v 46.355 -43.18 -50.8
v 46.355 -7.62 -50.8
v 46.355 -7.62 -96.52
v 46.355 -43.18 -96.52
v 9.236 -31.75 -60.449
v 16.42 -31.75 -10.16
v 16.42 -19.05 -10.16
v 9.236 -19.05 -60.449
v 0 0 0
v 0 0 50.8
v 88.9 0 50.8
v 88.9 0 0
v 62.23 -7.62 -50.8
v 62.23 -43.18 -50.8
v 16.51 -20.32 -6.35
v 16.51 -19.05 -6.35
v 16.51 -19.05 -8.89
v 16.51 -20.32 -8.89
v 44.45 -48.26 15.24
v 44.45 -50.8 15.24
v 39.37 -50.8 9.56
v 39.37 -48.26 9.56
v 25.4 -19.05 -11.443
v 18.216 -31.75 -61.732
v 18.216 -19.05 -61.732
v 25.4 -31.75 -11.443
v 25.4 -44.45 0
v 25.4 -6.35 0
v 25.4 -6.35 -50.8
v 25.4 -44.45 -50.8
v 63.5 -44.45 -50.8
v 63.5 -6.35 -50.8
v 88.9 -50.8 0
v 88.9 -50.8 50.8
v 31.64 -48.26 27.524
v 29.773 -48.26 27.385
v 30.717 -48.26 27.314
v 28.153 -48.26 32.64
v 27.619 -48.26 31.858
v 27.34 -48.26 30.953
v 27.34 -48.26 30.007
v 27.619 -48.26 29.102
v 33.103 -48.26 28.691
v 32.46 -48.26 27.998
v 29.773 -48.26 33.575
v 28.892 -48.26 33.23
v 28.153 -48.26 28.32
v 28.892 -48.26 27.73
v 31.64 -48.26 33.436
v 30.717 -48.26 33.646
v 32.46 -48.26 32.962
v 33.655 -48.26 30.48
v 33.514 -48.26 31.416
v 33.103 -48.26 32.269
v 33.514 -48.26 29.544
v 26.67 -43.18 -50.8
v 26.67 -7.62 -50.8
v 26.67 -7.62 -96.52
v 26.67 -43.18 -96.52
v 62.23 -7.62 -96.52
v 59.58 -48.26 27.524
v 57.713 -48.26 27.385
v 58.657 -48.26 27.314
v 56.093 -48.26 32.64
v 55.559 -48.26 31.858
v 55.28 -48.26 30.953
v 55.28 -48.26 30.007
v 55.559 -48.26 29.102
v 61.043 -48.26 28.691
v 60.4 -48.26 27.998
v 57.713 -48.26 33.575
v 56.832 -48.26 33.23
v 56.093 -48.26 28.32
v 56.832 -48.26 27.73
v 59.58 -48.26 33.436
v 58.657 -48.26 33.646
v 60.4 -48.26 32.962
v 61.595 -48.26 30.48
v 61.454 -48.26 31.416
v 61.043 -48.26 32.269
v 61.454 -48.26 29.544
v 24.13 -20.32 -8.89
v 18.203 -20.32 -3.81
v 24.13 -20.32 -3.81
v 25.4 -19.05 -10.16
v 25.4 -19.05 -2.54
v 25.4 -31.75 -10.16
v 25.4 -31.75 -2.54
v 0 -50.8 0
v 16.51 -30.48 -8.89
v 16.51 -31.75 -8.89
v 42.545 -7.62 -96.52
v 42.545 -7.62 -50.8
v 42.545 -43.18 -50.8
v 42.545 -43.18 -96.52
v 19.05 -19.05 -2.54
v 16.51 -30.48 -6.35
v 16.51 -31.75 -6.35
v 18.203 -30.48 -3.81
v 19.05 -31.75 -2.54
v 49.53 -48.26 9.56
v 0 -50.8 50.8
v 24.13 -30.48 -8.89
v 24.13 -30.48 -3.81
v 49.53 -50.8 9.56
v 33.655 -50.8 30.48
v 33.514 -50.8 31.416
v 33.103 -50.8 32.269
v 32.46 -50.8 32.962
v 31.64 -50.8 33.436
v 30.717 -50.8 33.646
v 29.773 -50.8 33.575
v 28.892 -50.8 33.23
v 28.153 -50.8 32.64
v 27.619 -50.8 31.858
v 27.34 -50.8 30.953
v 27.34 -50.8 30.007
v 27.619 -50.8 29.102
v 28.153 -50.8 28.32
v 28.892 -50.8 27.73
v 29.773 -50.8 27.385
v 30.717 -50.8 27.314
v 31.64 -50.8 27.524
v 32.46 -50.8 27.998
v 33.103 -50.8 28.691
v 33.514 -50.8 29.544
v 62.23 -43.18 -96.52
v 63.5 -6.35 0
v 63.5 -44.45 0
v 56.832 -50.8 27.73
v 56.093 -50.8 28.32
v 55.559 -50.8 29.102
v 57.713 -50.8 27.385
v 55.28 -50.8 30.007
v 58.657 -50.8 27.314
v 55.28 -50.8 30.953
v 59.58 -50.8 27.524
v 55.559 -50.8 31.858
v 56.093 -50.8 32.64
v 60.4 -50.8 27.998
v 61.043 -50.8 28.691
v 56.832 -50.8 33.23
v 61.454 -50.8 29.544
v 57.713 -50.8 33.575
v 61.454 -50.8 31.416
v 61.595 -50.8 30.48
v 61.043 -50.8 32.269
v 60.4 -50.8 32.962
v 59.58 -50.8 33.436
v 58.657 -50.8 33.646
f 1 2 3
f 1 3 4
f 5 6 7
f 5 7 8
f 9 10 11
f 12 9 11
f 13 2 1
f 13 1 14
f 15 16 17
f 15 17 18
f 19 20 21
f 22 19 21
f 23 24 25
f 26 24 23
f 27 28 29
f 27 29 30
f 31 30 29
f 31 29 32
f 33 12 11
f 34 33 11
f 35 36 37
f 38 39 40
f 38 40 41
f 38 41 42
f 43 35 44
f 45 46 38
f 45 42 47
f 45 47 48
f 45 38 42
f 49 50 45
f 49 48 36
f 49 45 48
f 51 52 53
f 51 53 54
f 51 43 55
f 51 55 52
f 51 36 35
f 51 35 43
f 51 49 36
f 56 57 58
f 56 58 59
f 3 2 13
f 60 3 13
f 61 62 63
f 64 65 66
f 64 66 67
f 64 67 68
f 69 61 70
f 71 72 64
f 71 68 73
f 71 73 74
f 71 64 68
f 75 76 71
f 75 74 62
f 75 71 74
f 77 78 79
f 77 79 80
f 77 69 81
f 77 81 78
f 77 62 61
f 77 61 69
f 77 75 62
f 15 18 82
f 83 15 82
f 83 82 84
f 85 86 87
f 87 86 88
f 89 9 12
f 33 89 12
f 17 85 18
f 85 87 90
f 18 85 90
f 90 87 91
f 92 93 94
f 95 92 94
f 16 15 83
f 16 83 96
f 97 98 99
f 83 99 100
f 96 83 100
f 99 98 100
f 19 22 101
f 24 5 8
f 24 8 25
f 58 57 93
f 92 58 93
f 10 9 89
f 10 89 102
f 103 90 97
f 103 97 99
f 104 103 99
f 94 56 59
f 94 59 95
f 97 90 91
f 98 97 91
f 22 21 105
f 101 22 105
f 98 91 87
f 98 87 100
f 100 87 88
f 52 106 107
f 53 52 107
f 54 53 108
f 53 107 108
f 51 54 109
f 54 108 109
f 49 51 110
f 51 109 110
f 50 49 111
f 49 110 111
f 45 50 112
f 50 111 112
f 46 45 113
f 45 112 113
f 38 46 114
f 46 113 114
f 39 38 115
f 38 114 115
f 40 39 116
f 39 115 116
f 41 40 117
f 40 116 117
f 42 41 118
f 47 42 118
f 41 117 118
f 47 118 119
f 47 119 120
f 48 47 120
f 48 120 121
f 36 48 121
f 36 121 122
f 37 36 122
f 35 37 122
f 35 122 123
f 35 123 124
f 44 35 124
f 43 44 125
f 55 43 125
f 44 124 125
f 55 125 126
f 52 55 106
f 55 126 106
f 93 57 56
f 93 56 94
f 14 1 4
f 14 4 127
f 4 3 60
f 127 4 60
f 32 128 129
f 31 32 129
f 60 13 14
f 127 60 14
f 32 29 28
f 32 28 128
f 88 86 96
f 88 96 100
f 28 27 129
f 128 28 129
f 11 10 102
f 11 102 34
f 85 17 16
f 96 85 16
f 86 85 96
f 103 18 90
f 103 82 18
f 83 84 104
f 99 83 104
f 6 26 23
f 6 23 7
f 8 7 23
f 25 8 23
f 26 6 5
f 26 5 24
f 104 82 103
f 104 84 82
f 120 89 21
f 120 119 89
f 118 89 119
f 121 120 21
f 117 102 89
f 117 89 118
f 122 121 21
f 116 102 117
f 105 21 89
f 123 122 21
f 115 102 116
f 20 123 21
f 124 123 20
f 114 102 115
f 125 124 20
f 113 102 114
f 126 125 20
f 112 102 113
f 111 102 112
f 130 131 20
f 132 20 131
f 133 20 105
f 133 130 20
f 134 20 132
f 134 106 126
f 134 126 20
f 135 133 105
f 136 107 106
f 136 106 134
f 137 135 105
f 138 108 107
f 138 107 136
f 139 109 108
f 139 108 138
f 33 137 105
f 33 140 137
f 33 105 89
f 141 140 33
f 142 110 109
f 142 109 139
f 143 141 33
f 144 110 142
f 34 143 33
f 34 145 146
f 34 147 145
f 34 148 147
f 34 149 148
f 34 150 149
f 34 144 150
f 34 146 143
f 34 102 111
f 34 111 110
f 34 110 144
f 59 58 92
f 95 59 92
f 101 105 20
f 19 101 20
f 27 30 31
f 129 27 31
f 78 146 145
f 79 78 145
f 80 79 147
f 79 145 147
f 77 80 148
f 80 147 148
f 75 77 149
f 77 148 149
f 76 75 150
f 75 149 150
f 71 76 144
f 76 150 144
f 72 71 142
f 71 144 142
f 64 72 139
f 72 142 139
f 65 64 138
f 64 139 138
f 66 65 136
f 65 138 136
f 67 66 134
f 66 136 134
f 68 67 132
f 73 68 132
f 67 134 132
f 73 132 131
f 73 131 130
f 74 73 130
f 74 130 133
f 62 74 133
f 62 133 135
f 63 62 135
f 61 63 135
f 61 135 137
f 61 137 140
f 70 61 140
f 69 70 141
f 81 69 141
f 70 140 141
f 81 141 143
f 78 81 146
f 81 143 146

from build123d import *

# Parameters (mm, degrees)
F0_W      = 88.9
F0_H      = 50.8
F1_DEPTH  = 50.8
F3_R      = 3.175
F4_DEPTH  = 2.54
F5_W      = 38.1
F5_H      = 38.1
F6_DEPTH  = 50.8
F7_W      = 15.875
F7_H      = 35.56
F8_DEPTH  = 45.72
F9_W      = 12.7
F9_H      = 7.62
F10_DEPTH = 8.89
F11_T     = -1.27
F13_DEPTH = 25.4
F15_DEPTH = 12.7


with BuildPart() as f1:
    # F0 (on Front) → F1 (new body)
    with BuildSketch(Plane.XZ):
        with Locations((44.45, 25.4)):
            Rectangle(F0_W, F0_H)
    extrude(amount=F1_DEPTH)

    # F3 (on face) → F4 (cut)
    with BuildSketch(Plane.XZ.offset(50.8)):
        with Locations((30.48, 30.48)):
            Circle(F3_R)
        with Locations((58.42, 30.48)):
            Circle(F3_R)
        Polygon((49.53, 9.560387), (44.45, 15.24), (39.37, 9.560387), align=None)
    extrude(amount=-F4_DEPTH, mode=Mode.SUBTRACT)


with BuildPart() as f6:
    # F5 (on face) → F6 (new body)
    with BuildSketch(Plane(origin=(0, 0, 0), x_dir=(1, 0, 0), z_dir=(0, 0, -1))):
        with Locations((44.45, 25.4)):
            Rectangle(F5_W, F5_H)
    extrude(amount=F6_DEPTH)


with BuildPart() as f8:
    # F7 (on face) → F8 (new body)
    with BuildSketch(Plane(origin=(0, 0, -50.8), x_dir=(1, 0, 0), z_dir=(0, 0, -1))):
        with Locations((34.6075, 25.4)):
            Rectangle(F7_W, F7_H)
        with Locations((54.2925, 25.4)):
            Rectangle(F7_W, F7_H)
    extrude(amount=F8_DEPTH)


with BuildPart() as f10:
    # F9 (on face) → F10 (new body)
    with BuildSketch(Plane(origin=(25.4, 0, 0), x_dir=(0, -1, 0), z_dir=(-1, 0, 0))):
        with Locations((25.4, -6.35)):
            Rectangle(F9_W, F9_H)
    extrude(amount=F10_DEPTH)

    # F11
    f11_openings = [f10.faces().sort_by_distance(p)[0] for p in [
        (16.51, -25.4, -6.35),
    ]]
    offset(amount=F11_T, openings=f11_openings)

    # F12 (on face) → F13 (cut)
    with BuildSketch(Plane.XZ.offset(31.75)):
        Polygon((16.51, -6.35), (19.05, -2.54), (16.51, -2.54), align=None)
        Polygon((25.4, -10.16), (16.51, -8.89), (16.51, -10.16), align=None)
    extrude(amount=-F13_DEPTH, mode=Mode.SUBTRACT)


with BuildPart() as f15:
    # F14 (on face) → F15 (new body, through all)
    with BuildSketch(Plane.XZ.offset(31.75)):
        Polygon((25.4, -11.442894), (16.419744, -10.16), (9.235539, -60.449434), (18.215795, -61.732328), align=None)
    extrude(amount=-F15_DEPTH)


solid = Compound([f1.part, f6.part, f8.part, f10.part, f15.part])
